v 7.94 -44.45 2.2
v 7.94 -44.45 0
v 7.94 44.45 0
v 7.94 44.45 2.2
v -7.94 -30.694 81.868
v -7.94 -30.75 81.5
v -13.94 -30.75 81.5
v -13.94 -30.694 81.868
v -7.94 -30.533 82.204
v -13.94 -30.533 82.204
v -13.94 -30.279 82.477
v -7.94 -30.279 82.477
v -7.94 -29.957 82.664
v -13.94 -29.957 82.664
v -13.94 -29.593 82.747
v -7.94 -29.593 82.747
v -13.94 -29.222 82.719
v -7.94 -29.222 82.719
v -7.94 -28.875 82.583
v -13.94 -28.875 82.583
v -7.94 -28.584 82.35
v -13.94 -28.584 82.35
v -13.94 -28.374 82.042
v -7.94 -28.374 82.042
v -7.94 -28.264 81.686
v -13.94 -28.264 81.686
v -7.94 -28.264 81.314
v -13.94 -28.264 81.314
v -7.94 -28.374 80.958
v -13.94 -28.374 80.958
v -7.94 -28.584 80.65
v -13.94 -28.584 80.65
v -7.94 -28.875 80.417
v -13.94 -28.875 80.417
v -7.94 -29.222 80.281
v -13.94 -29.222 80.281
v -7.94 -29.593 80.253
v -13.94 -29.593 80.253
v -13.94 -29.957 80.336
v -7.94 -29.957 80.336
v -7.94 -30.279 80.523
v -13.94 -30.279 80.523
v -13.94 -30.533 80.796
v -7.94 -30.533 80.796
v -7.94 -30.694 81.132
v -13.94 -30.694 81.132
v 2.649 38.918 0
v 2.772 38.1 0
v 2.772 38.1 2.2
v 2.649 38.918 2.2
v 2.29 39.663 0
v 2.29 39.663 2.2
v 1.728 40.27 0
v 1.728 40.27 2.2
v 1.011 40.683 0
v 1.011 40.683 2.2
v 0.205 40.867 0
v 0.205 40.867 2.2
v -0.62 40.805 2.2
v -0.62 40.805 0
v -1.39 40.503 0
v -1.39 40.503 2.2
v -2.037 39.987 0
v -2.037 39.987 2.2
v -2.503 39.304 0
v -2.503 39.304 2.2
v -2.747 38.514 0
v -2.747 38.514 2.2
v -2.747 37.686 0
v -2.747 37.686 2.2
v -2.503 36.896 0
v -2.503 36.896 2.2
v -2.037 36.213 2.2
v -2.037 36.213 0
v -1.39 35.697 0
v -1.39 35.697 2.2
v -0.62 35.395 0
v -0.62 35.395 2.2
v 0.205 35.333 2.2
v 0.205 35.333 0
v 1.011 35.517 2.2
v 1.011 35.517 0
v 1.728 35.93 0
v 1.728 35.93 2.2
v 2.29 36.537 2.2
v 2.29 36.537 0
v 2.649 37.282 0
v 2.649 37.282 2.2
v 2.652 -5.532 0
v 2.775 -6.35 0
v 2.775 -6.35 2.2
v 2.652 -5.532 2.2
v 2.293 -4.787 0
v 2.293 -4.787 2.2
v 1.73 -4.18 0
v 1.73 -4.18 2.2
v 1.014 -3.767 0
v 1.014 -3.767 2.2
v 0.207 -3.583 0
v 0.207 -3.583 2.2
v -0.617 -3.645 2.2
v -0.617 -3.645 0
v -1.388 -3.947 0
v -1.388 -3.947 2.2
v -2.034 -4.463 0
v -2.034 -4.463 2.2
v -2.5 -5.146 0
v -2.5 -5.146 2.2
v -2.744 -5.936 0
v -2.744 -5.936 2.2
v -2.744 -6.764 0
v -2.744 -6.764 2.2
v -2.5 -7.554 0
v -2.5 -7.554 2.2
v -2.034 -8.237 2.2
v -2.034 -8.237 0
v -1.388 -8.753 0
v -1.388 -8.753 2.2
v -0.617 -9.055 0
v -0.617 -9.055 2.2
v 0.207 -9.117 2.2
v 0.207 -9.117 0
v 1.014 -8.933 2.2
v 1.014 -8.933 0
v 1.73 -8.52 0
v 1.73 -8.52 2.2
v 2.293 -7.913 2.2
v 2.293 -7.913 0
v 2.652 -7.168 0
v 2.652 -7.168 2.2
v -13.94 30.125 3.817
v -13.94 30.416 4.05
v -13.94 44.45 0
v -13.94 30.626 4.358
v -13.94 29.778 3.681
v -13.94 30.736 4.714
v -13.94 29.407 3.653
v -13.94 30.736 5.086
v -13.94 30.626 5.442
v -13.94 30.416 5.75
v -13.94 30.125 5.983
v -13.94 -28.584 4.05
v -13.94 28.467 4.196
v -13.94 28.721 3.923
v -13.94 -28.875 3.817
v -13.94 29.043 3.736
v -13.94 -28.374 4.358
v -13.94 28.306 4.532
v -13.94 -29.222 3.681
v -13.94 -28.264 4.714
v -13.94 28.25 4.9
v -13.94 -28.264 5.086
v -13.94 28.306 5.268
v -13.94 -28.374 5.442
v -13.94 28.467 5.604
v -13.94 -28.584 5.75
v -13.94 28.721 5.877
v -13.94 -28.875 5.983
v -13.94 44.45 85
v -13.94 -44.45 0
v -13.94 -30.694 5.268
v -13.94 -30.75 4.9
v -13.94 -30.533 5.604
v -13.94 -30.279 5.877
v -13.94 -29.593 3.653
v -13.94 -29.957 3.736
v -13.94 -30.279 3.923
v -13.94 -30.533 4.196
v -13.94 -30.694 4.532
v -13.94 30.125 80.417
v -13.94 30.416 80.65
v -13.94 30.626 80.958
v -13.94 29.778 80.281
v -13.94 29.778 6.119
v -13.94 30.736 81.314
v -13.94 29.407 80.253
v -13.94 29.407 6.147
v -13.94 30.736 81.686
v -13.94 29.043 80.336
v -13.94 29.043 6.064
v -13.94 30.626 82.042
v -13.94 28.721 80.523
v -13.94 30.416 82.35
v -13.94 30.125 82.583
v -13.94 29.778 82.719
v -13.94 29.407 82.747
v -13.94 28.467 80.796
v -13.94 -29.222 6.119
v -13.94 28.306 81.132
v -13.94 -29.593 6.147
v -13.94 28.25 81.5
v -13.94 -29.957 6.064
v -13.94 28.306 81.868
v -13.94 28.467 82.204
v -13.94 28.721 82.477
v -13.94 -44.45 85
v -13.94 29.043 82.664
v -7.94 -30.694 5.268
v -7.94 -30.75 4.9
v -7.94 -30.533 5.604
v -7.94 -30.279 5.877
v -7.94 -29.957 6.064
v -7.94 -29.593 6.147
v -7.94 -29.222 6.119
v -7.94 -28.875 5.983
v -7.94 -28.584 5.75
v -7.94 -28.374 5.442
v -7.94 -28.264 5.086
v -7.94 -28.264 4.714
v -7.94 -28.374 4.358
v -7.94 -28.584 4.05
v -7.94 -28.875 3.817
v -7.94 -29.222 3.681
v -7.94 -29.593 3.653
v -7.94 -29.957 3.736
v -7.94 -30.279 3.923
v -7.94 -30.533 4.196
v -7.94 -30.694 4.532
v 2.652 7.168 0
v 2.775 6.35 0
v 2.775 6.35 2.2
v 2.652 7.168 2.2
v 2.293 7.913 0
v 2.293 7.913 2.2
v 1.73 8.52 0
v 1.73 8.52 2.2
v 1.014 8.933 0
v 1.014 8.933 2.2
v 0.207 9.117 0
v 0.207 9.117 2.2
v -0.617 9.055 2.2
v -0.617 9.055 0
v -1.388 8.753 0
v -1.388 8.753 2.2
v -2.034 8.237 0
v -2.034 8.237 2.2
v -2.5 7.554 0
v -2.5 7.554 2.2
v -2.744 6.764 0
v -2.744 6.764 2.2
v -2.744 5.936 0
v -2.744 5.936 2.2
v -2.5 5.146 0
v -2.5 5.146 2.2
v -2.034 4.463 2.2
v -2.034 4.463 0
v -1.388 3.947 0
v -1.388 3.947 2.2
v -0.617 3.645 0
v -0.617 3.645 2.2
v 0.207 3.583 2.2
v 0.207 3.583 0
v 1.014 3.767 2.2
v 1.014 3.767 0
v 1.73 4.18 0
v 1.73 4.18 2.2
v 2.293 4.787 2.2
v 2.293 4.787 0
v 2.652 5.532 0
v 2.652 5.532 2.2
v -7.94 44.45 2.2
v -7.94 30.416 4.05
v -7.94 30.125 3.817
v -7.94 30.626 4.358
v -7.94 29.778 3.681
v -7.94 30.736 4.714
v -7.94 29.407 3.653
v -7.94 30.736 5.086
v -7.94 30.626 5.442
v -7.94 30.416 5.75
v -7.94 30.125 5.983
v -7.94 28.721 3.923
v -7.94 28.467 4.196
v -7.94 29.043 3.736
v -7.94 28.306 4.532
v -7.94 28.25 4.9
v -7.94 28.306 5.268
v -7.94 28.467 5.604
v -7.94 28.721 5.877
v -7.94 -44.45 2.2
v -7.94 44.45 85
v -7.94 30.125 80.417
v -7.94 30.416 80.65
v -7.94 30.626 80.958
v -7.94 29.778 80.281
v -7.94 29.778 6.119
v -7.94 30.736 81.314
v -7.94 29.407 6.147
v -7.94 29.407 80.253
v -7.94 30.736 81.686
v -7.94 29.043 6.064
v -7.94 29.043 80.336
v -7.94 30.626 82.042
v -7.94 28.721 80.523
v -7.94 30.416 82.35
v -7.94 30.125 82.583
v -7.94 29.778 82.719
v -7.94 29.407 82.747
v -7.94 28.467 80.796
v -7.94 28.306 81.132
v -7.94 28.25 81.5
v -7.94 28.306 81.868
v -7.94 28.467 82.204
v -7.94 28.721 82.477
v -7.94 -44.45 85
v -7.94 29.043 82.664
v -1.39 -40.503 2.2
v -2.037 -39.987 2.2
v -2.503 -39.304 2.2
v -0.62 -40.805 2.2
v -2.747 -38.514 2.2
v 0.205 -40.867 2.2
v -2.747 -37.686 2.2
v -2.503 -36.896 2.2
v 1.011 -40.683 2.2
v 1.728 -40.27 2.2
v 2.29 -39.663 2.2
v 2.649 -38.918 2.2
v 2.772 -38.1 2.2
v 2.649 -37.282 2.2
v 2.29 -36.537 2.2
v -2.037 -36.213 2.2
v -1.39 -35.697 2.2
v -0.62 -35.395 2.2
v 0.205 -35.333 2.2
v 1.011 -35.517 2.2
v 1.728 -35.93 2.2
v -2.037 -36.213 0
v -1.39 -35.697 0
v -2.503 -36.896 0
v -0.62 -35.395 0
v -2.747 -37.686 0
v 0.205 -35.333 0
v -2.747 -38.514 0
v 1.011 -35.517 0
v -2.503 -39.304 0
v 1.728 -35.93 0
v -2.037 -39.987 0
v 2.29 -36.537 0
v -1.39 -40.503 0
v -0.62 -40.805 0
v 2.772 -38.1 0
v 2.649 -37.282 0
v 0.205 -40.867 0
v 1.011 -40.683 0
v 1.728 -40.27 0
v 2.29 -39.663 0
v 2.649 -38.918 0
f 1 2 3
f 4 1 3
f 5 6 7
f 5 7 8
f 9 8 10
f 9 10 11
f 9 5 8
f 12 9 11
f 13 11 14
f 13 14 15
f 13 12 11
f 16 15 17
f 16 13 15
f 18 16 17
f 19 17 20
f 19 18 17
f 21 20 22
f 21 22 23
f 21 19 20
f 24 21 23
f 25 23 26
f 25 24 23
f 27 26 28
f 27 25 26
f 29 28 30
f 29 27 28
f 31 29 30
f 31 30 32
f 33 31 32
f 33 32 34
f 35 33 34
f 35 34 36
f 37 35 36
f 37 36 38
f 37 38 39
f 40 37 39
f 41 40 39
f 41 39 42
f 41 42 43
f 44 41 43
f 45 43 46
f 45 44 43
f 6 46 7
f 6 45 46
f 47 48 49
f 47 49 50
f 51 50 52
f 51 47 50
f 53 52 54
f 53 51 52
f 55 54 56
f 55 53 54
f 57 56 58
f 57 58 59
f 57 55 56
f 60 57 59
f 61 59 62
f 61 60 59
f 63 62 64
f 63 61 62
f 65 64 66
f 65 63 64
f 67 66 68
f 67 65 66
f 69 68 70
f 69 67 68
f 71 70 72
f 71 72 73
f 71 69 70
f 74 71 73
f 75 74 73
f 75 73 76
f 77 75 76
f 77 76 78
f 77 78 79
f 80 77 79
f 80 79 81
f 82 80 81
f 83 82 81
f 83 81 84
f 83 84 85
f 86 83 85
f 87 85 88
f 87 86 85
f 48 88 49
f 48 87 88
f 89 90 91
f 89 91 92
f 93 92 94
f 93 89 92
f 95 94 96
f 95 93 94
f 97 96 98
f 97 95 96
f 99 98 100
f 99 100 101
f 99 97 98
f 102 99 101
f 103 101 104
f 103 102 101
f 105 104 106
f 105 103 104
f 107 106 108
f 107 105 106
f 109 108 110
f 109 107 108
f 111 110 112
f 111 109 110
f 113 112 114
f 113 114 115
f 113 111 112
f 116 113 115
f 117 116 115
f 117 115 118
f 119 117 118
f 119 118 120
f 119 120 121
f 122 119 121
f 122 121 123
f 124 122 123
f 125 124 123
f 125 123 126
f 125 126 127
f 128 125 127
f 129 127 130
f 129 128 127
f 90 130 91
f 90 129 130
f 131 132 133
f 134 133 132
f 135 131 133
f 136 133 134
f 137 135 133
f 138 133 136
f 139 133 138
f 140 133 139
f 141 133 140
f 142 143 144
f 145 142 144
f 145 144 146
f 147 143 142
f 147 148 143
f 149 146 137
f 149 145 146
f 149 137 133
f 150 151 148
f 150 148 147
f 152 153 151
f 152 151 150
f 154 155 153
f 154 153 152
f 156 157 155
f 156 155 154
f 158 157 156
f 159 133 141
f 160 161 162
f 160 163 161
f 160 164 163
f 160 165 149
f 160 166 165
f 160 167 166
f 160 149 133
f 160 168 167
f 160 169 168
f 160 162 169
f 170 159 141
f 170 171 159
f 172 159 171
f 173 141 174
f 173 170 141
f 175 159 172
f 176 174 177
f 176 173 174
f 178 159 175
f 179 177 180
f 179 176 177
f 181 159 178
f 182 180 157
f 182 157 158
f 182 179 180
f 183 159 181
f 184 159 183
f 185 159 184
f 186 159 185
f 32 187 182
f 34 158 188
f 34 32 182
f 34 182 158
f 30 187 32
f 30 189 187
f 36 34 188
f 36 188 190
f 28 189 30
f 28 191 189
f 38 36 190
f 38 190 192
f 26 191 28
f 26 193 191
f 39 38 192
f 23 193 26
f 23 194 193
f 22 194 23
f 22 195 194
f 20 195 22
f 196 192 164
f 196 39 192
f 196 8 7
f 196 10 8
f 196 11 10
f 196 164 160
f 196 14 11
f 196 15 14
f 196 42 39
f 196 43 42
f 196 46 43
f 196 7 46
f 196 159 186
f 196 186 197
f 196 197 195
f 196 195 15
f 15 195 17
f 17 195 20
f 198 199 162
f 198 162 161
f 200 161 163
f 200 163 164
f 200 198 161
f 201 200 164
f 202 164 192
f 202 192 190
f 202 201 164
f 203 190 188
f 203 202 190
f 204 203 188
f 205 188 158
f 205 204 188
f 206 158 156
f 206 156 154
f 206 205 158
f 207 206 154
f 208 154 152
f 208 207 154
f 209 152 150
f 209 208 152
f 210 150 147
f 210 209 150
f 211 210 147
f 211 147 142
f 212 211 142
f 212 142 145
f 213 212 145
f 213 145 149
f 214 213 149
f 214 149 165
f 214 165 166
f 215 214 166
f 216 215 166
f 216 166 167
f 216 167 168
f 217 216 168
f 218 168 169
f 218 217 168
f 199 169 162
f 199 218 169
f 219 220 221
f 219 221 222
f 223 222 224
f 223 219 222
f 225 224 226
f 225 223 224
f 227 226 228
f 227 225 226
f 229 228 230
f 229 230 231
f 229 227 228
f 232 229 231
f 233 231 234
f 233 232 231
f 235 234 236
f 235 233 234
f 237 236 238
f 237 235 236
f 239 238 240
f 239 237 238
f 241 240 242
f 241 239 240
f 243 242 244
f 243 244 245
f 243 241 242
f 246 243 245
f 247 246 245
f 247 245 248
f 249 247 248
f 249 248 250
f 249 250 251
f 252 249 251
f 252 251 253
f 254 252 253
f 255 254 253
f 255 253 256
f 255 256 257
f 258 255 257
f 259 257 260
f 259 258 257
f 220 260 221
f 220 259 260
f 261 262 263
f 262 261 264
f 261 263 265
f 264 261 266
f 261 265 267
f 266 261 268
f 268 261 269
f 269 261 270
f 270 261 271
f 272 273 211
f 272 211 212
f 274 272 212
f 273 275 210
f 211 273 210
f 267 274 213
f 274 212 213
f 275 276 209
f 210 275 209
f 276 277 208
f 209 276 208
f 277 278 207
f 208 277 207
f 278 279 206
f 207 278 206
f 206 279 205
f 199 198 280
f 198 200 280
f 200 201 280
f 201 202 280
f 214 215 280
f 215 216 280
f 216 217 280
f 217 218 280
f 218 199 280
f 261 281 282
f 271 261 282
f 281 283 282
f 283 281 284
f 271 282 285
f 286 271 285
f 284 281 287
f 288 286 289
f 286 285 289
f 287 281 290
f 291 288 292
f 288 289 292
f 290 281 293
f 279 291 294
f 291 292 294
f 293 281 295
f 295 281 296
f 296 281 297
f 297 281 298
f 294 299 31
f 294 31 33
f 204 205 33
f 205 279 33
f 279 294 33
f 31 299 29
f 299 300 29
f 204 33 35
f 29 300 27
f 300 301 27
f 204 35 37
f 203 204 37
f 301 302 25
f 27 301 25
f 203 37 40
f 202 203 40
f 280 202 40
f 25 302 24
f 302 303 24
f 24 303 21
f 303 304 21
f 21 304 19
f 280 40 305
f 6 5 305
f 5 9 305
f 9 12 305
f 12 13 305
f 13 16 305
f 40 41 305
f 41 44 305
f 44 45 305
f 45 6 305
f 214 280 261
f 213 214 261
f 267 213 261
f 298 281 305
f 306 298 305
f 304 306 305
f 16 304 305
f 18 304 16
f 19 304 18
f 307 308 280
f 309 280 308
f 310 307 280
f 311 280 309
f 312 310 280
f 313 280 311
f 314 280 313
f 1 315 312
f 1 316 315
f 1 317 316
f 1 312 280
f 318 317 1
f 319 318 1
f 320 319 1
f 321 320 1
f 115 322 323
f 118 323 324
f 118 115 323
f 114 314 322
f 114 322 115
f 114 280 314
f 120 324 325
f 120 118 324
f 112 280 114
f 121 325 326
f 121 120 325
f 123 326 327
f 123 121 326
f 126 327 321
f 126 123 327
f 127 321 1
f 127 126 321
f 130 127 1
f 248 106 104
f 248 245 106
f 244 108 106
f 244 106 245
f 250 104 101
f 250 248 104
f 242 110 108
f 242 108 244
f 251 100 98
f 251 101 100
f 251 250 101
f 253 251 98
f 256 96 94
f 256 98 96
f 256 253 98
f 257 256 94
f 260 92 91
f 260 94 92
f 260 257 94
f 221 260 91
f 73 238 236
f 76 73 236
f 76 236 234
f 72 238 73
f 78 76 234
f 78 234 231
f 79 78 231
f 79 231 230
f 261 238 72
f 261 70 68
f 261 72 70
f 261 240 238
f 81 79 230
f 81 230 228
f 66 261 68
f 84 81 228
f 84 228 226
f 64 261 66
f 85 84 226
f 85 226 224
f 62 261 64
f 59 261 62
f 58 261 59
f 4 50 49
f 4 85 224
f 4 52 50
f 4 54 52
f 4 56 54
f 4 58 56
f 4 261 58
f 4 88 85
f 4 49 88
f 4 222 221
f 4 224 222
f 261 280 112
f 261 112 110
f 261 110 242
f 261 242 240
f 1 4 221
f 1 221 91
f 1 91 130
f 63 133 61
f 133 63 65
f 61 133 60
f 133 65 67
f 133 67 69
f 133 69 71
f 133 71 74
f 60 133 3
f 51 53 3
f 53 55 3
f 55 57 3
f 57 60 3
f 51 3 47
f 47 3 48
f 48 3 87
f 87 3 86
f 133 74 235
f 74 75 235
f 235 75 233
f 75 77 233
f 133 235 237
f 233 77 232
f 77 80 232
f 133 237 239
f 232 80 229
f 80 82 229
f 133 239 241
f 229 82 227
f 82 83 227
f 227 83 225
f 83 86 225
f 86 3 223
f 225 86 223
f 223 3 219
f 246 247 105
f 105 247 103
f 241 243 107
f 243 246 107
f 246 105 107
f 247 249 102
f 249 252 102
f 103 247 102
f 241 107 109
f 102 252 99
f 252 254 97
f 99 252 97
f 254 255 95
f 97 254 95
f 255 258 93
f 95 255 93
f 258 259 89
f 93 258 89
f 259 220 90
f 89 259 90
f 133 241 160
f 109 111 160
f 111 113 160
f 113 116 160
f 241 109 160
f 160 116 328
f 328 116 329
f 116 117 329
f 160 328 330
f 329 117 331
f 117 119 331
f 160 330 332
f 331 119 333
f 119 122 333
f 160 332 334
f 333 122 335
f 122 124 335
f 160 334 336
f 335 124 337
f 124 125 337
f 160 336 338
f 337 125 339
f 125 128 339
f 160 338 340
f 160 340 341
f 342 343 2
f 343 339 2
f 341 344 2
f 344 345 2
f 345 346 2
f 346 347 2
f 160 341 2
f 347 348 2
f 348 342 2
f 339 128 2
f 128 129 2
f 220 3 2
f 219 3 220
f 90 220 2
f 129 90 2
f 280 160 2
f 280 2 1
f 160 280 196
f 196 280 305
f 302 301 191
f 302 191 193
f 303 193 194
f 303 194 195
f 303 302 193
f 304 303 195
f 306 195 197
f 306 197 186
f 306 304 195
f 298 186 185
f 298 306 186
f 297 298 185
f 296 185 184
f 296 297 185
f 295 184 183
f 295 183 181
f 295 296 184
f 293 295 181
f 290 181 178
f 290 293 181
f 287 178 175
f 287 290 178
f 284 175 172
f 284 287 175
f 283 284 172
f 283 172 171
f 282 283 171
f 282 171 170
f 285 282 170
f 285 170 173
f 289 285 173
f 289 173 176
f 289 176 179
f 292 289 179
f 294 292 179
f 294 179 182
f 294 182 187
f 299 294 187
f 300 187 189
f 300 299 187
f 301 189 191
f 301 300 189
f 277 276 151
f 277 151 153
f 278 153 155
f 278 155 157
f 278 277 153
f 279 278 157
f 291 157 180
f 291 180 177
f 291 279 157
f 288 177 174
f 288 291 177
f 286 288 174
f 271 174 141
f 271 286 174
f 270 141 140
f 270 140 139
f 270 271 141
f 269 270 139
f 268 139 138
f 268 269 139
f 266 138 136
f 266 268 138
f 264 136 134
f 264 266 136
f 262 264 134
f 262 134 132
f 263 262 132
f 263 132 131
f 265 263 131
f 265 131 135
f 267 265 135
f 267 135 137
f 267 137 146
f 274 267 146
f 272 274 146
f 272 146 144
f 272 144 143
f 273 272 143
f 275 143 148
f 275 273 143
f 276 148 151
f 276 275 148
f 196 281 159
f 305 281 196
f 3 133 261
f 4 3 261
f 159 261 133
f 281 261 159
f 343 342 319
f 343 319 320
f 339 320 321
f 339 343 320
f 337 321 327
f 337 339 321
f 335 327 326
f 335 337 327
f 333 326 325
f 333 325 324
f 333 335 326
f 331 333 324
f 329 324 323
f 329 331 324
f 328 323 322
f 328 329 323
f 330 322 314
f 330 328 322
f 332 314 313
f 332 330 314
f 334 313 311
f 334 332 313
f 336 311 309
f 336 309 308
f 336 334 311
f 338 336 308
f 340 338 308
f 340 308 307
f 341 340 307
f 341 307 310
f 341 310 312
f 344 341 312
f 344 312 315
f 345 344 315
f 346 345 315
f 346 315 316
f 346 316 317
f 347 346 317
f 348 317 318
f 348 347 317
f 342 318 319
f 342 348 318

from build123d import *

# Parameters (mm, degrees)
SKETCH_W     = 15.88
SKETCH_H     = 88.9
SKETCH_R     = 2.775
PAD_DEPTH    = 2.2
SKETCH001_W  = 88.9
SKETCH001_H  = 85
SKETCH001_R  = 1.25
PAD001_DEPTH = 6


with BuildPart() as part:
    # Sketch → Pad (new body)
    with BuildSketch(Plane.XY):
        Rectangle(SKETCH_W, SKETCH_H)
        with Locations((-0.0025, 38.1)):
            Circle(SKETCH_R, mode=Mode.SUBTRACT)
        with Locations((-0.0025, -38.1)):
            Circle(SKETCH_R, mode=Mode.SUBTRACT)
        with Locations((0, -6.35)):
            Circle(SKETCH_R, mode=Mode.SUBTRACT)
        with Locations((0, 6.35)):
            Circle(SKETCH_R, mode=Mode.SUBTRACT)
    extrude(amount=PAD_DEPTH)

    # Sketch001 (on Face4 of Pad) → Pad001 (join)
    with BuildSketch(Plane(origin=(-7.94, 0, 0), x_dir=(0, -1, 0), z_dir=(-1, 0, 0))):
        with Locations((0, 42.5)):
            Rectangle(SKETCH001_W, SKETCH001_H)
        with Locations((-29.5, 4.9)):
            Circle(SKETCH001_R, mode=Mode.SUBTRACT)
        with Locations((29.5, 4.9)):
            Circle(SKETCH001_R, mode=Mode.SUBTRACT)
        with Locations((29.5, 81.5)):
            Circle(SKETCH001_R, mode=Mode.SUBTRACT)
        with Locations((-29.5, 81.5)):
            Circle(SKETCH001_R, mode=Mode.SUBTRACT)
    extrude(amount=PAD001_DEPTH)


solid = part.part
